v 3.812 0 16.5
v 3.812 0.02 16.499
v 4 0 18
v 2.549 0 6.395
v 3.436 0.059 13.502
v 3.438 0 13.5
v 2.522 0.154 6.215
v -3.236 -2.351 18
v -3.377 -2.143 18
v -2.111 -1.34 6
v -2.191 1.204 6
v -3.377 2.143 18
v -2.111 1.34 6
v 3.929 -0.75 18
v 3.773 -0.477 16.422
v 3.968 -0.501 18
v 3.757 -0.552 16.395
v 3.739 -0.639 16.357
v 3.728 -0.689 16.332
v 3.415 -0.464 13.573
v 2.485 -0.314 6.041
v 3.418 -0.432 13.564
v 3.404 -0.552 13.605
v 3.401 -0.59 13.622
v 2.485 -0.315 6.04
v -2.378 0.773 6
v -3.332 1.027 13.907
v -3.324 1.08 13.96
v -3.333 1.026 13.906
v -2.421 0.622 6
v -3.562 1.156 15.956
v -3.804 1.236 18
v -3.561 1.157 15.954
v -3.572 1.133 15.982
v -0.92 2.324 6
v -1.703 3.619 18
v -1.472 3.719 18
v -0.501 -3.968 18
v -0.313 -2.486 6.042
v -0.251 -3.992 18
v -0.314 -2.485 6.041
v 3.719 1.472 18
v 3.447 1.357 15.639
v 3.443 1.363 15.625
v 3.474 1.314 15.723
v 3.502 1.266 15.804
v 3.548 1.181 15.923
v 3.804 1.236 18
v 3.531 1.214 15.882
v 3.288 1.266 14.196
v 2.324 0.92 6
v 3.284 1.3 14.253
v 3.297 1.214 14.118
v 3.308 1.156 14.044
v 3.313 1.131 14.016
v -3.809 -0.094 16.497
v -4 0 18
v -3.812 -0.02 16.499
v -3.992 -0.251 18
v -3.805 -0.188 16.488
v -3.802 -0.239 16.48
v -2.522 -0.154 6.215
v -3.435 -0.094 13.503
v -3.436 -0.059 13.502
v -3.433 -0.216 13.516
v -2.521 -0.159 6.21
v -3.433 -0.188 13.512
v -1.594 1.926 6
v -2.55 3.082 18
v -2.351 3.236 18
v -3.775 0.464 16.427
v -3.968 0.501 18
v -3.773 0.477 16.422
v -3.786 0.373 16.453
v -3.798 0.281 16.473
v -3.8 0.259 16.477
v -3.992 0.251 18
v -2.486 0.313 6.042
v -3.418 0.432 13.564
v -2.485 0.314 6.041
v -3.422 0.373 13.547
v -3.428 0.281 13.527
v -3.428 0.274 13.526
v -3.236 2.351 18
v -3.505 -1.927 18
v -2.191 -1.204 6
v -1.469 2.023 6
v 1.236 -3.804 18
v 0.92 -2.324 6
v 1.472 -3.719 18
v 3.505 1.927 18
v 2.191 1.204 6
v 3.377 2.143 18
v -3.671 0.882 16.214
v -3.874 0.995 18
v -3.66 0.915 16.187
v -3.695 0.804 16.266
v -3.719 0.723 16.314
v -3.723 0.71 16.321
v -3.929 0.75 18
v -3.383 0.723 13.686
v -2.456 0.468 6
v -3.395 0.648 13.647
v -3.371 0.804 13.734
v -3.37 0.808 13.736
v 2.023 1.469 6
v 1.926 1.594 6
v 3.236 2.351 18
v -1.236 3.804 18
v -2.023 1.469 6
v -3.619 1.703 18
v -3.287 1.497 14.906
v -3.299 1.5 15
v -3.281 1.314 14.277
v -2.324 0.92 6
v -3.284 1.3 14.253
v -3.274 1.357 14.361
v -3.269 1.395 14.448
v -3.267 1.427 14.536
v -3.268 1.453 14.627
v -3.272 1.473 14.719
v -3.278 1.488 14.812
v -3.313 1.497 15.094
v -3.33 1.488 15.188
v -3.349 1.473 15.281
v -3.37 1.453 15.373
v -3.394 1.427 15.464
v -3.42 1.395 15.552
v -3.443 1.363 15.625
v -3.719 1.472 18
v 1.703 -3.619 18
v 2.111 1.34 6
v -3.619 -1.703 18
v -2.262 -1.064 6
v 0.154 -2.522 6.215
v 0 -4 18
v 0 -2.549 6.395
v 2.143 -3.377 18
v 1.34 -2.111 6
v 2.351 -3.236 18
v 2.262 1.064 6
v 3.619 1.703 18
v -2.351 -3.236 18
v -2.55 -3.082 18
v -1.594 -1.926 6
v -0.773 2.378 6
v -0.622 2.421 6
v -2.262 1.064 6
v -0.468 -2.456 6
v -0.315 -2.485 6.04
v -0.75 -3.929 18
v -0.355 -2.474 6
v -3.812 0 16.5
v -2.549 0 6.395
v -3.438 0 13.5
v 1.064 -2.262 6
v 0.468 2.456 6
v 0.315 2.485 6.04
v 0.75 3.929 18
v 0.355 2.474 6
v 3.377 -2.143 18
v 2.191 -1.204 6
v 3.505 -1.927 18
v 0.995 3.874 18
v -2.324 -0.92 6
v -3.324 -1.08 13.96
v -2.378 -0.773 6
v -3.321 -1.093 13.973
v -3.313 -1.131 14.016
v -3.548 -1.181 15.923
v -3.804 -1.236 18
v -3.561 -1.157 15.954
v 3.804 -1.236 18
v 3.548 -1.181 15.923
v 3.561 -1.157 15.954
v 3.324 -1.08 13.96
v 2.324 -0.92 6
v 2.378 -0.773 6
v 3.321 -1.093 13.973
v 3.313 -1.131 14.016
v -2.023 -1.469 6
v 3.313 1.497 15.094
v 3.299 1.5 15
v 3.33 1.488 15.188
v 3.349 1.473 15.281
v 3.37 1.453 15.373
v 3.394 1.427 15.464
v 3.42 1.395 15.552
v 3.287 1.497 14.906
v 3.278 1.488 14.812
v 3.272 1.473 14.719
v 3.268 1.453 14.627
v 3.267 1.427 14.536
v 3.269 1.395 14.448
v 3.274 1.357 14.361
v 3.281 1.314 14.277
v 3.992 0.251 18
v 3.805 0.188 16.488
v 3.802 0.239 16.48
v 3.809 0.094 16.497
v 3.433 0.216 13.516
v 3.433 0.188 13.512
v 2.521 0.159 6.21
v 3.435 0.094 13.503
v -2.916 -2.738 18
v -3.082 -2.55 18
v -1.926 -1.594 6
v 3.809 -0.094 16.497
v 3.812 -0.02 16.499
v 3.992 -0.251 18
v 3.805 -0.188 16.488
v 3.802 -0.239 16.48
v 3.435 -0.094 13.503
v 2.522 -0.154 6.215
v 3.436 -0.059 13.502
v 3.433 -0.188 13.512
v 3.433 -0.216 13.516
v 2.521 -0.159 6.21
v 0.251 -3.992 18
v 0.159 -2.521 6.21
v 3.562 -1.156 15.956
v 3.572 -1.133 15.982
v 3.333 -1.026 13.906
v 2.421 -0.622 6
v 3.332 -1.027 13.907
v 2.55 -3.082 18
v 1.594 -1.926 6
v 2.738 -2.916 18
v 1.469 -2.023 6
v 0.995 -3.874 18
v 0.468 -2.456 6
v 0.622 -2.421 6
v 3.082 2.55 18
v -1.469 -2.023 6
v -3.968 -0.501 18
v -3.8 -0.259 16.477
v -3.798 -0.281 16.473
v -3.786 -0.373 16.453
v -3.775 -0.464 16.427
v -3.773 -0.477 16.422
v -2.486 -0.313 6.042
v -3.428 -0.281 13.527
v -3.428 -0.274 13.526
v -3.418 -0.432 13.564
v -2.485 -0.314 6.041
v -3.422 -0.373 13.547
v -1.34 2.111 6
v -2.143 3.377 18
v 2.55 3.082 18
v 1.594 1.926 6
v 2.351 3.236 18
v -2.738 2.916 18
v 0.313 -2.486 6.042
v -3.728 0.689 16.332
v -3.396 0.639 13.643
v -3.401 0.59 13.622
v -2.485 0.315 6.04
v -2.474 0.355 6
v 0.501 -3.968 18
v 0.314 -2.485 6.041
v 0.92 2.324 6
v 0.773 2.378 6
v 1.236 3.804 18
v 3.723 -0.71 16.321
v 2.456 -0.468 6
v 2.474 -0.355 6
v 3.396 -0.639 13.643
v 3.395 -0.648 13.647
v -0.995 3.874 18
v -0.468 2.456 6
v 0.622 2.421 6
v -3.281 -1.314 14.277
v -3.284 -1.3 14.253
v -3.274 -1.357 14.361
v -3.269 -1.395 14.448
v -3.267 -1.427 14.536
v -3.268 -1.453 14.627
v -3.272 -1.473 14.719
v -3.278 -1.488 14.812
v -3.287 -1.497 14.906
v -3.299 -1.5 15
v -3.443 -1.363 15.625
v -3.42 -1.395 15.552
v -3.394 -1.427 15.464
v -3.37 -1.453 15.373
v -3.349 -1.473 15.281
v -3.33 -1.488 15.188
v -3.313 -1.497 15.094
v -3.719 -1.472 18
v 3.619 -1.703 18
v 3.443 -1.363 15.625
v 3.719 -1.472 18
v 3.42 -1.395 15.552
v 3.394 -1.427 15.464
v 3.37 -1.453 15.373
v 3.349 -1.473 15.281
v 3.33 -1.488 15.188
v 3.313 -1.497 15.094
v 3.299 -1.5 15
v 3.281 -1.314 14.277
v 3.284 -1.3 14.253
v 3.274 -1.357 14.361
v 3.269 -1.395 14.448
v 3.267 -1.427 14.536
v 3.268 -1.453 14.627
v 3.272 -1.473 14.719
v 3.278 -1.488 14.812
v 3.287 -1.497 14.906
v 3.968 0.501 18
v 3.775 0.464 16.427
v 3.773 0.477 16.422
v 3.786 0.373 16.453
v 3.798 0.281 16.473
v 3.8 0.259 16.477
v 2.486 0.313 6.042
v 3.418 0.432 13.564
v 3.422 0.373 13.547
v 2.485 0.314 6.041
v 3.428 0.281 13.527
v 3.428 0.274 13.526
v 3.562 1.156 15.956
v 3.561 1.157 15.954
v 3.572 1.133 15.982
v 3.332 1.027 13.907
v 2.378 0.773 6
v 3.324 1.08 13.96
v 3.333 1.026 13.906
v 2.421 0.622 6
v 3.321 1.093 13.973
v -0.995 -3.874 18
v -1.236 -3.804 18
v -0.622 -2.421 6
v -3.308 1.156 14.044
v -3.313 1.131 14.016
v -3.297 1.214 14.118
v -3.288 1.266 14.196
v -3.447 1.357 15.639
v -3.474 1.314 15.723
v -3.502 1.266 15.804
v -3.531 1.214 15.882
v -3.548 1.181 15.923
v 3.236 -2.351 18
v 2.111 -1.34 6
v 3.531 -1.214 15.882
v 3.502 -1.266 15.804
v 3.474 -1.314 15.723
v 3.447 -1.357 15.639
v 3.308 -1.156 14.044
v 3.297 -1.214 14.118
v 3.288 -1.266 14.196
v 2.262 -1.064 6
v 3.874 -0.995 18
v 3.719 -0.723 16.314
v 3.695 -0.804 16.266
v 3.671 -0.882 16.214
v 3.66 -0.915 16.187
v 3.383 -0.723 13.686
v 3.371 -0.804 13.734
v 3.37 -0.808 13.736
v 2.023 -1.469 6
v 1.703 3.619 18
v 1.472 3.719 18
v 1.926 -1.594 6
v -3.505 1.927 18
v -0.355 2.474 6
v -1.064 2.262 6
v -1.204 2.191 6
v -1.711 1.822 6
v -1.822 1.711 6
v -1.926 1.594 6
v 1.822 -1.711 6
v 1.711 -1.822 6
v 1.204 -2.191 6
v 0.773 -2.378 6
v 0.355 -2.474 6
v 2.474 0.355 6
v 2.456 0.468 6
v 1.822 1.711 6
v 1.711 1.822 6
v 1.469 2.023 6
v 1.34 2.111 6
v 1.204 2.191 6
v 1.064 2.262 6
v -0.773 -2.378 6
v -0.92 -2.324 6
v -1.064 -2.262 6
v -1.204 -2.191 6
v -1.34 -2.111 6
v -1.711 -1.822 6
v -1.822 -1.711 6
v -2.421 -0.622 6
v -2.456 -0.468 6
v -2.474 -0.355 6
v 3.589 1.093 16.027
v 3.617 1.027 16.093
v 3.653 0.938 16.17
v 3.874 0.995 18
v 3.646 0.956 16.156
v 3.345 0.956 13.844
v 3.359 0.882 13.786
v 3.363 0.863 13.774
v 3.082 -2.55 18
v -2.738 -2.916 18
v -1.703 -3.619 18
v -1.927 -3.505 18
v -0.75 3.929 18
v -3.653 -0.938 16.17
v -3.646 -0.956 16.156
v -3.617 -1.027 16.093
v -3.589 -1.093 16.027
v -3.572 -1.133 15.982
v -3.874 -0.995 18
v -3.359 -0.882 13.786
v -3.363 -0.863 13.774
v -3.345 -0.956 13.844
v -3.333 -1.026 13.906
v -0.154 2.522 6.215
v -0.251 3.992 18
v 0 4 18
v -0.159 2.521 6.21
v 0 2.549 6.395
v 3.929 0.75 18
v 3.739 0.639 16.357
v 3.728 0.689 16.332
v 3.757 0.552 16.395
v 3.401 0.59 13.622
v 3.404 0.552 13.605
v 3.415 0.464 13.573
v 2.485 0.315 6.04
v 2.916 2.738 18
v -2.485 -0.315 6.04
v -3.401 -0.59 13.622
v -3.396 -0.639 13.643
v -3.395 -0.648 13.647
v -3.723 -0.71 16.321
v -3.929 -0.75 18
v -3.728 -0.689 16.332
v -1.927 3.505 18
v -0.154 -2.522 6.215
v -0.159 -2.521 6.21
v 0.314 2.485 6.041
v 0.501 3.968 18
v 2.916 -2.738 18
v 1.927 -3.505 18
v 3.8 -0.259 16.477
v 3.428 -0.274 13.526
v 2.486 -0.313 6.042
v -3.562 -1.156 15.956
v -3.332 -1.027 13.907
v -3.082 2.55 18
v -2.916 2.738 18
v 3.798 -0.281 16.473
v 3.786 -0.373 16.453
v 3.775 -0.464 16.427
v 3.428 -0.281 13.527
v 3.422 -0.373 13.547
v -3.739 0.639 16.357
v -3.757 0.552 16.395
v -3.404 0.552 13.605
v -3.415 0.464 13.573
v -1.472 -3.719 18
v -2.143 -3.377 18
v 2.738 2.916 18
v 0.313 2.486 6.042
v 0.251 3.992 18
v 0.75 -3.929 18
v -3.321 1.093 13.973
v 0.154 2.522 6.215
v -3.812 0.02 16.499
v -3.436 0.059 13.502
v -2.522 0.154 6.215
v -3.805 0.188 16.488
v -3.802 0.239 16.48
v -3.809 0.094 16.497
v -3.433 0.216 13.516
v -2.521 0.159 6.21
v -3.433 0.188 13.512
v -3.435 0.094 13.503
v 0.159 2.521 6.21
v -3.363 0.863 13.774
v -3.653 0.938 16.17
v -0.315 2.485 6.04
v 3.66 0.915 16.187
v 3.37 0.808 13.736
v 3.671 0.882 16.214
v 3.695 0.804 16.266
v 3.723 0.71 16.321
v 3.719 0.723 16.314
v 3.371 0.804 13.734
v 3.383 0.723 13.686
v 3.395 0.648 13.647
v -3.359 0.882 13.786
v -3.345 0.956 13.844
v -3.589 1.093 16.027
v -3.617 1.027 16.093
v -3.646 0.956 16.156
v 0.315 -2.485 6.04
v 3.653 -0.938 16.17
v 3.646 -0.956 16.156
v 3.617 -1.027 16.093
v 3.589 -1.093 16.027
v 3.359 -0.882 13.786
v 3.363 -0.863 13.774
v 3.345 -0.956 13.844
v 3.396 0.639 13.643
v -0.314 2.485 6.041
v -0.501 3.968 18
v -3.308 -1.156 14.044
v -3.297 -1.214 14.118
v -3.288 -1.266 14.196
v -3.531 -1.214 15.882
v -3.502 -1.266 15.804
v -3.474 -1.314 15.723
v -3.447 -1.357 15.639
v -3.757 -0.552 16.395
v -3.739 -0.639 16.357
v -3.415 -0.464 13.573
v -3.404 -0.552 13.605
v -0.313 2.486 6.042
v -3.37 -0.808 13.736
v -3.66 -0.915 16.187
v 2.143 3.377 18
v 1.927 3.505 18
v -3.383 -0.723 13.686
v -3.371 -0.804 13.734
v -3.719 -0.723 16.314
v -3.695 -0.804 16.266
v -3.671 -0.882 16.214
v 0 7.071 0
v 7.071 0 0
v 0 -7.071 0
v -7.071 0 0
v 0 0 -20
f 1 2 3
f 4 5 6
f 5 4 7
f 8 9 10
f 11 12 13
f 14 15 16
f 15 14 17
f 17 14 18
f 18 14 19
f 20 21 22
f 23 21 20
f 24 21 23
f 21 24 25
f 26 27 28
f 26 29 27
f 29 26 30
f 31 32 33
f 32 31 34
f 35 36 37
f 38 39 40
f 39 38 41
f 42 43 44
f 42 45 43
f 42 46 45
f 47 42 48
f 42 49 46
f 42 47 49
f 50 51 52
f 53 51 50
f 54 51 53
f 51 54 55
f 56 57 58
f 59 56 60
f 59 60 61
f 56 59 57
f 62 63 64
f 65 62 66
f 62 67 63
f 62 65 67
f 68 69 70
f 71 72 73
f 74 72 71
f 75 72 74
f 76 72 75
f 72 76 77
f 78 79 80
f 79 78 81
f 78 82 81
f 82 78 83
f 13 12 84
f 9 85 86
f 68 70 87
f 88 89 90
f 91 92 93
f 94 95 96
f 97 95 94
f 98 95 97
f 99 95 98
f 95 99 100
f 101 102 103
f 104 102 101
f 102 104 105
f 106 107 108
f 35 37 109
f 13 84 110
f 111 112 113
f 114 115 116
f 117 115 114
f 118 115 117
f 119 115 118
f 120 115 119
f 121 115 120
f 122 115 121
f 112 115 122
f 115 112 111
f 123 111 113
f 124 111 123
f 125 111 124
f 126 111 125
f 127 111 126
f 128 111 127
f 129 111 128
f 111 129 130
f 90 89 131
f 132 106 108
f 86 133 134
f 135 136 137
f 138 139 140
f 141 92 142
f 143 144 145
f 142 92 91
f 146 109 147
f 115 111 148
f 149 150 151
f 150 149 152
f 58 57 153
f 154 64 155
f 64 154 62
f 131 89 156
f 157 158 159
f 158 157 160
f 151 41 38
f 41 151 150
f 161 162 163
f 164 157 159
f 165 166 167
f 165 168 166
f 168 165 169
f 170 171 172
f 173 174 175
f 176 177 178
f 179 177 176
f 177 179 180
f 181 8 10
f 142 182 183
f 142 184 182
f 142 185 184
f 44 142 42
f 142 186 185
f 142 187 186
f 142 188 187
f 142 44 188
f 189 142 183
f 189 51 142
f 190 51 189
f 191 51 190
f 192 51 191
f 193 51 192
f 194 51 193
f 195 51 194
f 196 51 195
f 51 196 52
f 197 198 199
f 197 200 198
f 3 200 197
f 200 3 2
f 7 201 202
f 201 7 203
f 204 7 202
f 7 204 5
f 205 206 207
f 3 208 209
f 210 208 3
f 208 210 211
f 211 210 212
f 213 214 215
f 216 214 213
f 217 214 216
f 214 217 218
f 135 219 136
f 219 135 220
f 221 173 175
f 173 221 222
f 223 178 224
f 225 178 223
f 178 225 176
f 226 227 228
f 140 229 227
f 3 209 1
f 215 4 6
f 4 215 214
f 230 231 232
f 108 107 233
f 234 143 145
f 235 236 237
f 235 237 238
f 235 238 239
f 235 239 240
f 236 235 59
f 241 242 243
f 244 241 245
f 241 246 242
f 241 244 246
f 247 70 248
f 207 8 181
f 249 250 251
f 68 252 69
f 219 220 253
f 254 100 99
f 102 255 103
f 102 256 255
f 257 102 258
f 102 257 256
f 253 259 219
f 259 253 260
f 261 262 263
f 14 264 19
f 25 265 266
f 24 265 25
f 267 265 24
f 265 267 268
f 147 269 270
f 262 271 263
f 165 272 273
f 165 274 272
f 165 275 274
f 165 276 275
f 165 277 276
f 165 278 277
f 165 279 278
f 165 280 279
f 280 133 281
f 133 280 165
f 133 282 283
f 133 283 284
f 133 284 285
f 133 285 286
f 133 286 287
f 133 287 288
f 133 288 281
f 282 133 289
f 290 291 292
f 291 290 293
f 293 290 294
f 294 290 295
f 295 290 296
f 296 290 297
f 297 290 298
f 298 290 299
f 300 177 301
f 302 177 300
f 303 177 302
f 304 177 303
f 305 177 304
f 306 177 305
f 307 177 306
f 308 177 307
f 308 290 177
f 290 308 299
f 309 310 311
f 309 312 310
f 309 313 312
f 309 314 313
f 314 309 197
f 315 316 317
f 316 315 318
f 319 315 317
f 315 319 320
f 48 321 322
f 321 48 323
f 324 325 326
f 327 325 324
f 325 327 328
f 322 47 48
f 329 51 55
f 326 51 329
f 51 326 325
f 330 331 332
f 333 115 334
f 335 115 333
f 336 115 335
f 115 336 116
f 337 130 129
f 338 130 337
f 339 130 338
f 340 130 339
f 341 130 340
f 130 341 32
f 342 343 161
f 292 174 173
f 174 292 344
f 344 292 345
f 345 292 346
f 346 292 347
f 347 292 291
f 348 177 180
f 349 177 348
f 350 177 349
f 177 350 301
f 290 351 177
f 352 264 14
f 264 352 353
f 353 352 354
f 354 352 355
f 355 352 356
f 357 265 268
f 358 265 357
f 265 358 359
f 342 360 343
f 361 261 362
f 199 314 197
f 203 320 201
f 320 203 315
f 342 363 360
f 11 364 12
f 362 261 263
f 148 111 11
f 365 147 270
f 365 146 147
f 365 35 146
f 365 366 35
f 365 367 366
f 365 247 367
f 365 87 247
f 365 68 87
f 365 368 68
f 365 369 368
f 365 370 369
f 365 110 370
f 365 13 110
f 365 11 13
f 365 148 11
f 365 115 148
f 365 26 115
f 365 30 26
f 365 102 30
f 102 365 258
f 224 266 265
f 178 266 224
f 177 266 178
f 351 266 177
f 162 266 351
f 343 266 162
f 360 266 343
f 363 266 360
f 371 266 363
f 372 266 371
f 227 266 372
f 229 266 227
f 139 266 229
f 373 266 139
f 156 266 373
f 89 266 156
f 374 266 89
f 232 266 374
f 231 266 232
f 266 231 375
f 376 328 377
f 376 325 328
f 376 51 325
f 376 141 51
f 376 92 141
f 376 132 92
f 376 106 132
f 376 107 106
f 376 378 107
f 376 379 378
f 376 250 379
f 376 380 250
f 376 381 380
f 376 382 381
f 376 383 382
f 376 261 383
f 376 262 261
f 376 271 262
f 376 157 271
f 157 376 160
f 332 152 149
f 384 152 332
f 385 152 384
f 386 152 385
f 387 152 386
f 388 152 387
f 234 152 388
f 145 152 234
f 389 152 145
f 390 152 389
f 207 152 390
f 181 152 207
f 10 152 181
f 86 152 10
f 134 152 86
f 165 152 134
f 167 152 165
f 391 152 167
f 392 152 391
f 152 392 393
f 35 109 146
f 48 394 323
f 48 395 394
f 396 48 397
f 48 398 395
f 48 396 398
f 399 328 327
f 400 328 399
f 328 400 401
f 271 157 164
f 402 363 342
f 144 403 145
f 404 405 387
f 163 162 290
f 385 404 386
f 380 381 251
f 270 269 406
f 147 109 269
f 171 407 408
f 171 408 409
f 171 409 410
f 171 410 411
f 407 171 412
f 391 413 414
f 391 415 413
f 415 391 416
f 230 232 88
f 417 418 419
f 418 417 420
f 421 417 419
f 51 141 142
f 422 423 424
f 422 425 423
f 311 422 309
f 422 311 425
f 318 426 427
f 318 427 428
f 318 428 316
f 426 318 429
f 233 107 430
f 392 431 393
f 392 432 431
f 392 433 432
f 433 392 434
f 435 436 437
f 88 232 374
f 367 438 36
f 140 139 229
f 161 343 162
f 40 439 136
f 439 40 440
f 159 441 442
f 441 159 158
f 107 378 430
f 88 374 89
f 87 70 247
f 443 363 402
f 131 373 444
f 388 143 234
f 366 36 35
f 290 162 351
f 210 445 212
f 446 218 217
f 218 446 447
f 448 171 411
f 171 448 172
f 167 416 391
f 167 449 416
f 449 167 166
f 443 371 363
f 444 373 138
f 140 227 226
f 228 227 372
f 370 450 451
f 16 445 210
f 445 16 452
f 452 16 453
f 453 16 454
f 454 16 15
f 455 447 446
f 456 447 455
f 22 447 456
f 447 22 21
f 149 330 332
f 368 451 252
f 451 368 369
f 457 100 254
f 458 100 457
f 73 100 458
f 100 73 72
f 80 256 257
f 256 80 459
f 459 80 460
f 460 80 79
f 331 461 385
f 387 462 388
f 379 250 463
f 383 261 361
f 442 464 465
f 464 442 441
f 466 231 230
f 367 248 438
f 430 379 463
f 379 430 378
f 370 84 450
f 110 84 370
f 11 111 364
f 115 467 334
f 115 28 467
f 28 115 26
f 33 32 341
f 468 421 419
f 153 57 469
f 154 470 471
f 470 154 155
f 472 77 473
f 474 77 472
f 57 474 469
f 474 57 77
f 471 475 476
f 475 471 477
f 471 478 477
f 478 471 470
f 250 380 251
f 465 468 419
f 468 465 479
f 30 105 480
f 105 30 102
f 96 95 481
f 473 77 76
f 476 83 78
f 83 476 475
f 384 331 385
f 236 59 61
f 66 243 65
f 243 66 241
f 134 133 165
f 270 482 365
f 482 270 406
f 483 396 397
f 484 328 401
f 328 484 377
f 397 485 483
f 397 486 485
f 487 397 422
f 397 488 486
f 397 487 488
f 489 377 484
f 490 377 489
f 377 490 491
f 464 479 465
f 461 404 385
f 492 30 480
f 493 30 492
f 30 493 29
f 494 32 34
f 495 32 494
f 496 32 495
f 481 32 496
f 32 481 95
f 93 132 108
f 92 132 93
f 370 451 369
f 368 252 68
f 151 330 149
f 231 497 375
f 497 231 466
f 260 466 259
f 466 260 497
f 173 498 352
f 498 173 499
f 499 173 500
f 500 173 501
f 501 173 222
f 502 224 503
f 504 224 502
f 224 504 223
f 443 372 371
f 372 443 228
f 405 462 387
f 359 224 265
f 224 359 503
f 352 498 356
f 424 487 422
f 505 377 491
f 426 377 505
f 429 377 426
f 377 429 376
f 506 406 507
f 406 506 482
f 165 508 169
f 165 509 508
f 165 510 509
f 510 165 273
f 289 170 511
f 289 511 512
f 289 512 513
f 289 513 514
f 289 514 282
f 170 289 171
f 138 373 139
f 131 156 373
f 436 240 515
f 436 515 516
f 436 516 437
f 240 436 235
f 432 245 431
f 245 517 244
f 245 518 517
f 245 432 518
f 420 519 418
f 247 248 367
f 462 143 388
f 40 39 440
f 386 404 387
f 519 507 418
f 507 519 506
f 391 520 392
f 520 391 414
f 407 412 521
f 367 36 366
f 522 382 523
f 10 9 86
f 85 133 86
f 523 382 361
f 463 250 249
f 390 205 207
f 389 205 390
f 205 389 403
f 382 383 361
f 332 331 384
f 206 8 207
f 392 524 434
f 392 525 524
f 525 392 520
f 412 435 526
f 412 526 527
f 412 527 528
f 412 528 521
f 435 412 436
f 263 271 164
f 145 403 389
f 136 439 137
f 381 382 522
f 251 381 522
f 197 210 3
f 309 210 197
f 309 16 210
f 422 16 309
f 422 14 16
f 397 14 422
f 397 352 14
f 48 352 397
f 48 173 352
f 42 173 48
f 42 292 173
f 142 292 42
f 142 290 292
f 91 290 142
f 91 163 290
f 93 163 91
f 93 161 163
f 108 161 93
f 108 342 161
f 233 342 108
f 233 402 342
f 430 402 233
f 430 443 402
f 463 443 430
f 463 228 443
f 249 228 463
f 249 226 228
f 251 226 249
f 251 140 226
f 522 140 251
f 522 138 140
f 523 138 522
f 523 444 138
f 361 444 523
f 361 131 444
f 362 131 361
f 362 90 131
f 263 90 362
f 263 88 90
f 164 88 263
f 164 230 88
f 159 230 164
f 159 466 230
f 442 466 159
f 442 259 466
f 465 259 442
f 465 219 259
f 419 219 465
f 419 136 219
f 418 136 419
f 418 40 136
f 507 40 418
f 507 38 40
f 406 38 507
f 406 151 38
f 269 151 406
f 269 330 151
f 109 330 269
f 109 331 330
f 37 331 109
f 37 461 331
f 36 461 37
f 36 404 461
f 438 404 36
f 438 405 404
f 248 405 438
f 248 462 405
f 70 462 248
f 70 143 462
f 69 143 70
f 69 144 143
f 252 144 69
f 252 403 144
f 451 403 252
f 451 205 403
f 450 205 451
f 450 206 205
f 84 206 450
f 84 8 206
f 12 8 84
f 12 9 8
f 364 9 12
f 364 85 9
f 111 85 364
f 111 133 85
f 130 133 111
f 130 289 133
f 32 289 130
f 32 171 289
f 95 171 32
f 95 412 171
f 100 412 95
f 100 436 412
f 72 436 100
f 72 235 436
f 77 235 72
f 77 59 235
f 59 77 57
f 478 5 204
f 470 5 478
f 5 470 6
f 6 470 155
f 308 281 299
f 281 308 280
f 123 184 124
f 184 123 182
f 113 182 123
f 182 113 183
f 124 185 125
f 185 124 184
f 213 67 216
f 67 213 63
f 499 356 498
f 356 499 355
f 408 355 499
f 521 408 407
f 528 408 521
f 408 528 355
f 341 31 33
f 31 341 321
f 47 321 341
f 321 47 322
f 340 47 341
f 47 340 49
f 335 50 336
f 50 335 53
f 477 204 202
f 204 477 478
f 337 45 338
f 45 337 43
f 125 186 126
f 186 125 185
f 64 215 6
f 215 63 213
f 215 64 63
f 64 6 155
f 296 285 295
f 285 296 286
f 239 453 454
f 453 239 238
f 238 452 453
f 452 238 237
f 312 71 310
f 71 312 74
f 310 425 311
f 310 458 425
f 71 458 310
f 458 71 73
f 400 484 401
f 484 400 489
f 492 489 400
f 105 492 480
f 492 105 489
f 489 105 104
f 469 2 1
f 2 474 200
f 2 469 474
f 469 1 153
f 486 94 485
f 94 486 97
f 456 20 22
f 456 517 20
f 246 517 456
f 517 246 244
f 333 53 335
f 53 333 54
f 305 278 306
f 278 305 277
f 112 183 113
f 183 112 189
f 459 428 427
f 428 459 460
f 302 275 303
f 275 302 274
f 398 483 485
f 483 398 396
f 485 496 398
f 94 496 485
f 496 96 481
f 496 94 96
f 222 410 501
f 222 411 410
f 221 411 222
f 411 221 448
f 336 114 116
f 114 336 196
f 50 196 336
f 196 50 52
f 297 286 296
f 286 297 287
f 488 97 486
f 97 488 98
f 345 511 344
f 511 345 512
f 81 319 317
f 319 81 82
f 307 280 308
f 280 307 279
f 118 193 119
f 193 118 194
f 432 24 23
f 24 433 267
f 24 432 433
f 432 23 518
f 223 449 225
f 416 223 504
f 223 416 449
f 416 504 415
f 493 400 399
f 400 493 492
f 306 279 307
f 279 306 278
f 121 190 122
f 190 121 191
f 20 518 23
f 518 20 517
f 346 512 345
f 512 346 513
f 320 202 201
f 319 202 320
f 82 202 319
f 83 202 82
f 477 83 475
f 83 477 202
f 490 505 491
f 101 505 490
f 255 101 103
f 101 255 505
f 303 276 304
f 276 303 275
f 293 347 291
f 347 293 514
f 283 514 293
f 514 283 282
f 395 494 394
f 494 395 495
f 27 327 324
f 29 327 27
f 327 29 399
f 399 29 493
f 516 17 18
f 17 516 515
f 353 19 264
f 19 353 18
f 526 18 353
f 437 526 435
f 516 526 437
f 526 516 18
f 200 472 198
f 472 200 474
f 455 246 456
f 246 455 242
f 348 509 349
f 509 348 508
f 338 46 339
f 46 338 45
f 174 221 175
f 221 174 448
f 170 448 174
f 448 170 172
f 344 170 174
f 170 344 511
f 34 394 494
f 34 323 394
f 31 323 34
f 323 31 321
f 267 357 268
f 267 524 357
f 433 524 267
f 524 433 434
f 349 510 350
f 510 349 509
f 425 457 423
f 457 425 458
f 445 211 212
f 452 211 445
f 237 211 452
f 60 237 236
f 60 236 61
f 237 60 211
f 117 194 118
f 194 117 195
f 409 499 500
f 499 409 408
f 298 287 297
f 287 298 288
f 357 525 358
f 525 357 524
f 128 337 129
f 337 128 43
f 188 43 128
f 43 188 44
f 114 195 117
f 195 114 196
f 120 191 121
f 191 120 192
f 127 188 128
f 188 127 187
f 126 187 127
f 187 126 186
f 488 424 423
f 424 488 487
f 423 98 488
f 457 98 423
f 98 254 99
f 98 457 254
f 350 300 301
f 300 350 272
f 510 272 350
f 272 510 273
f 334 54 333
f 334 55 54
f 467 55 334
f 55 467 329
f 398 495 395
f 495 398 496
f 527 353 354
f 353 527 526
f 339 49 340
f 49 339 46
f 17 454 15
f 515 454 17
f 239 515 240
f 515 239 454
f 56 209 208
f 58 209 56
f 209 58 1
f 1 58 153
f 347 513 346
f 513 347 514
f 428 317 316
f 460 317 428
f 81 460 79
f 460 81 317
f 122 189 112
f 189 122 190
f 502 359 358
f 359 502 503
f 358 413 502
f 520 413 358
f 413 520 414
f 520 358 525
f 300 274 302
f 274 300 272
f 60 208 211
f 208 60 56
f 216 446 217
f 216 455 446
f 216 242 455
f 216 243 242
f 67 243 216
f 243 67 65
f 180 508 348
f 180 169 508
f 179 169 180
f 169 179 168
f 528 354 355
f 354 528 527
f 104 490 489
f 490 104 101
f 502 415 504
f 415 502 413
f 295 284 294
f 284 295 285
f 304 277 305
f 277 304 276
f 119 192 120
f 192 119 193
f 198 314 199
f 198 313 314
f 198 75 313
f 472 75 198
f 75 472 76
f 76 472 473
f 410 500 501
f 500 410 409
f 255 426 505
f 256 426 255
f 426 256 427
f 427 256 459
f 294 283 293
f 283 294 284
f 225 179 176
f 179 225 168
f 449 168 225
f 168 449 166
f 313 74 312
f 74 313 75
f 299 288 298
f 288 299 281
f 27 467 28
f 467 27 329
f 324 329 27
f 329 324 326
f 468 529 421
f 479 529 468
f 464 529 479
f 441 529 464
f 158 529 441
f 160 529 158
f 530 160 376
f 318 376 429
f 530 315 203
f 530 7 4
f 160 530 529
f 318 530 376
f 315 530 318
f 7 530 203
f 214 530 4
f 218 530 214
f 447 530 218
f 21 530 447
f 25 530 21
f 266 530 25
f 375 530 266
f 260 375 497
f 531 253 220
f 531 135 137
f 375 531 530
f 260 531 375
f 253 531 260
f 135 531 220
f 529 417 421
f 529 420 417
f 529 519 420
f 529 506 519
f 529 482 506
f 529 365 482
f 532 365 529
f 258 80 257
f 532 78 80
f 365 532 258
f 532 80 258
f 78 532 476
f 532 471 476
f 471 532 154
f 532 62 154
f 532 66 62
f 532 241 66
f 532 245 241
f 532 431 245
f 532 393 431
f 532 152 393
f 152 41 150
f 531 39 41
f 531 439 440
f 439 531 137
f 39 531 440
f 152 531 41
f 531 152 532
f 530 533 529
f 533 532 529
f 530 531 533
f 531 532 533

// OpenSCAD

hole_size = 1.5; //Radius of the hole.
//To make a hole on the top cylinder.
difference() {
   translate([0,0,12])
	cylinder(12,2.5,4, center = true, $fn=100);

	translate([0,0,15]) 
	rotate([90,0,90])
      cylinder (10, hole_size,hole_size, center = true, $fn=100);
}

// 2 Pyramids to complete the model.
// We can do this in a loop with variables, but have kept it simple to be clear.

//1st pyramid for the top part.

apex_point_top_pyramid = 10; //Apex point for top pyramid, which is inside the cylinder.
rotate(a=[0,0,45])
polyhedron(
  points=[ [5,5,0],[5,-5,0],[-5,-5,0],[-5,5,0], // the four points at base
           [0,0,apex_point_top_pyramid]  ],                                 // the apex point 
  triangles=[ [0,1,4],[1,2,4],[2,3,4],[3,0,4],          // each triangle side
              [1,0,3],[2,1,3] ]                         // two triangles for square base
 );


//2nd pyramid for the bottom part.
apex_point_bottom_pyramid = 20;
rotate(a=[180,0,45])
polyhedron(
  points=[ [5,5,0],[5,-5,0],[-5,-5,0],[-5,5,0], // the four points at base
           [0,0,apex_point_bottom_pyramid]  ],                                 // the apex point 
  triangles=[ [0,1,4],[1,2,4],[2,3,4],[3,0,4],          // each triangle side
              [1,0,3],[2,1,3] ]                         // two triangles for square base
 );

